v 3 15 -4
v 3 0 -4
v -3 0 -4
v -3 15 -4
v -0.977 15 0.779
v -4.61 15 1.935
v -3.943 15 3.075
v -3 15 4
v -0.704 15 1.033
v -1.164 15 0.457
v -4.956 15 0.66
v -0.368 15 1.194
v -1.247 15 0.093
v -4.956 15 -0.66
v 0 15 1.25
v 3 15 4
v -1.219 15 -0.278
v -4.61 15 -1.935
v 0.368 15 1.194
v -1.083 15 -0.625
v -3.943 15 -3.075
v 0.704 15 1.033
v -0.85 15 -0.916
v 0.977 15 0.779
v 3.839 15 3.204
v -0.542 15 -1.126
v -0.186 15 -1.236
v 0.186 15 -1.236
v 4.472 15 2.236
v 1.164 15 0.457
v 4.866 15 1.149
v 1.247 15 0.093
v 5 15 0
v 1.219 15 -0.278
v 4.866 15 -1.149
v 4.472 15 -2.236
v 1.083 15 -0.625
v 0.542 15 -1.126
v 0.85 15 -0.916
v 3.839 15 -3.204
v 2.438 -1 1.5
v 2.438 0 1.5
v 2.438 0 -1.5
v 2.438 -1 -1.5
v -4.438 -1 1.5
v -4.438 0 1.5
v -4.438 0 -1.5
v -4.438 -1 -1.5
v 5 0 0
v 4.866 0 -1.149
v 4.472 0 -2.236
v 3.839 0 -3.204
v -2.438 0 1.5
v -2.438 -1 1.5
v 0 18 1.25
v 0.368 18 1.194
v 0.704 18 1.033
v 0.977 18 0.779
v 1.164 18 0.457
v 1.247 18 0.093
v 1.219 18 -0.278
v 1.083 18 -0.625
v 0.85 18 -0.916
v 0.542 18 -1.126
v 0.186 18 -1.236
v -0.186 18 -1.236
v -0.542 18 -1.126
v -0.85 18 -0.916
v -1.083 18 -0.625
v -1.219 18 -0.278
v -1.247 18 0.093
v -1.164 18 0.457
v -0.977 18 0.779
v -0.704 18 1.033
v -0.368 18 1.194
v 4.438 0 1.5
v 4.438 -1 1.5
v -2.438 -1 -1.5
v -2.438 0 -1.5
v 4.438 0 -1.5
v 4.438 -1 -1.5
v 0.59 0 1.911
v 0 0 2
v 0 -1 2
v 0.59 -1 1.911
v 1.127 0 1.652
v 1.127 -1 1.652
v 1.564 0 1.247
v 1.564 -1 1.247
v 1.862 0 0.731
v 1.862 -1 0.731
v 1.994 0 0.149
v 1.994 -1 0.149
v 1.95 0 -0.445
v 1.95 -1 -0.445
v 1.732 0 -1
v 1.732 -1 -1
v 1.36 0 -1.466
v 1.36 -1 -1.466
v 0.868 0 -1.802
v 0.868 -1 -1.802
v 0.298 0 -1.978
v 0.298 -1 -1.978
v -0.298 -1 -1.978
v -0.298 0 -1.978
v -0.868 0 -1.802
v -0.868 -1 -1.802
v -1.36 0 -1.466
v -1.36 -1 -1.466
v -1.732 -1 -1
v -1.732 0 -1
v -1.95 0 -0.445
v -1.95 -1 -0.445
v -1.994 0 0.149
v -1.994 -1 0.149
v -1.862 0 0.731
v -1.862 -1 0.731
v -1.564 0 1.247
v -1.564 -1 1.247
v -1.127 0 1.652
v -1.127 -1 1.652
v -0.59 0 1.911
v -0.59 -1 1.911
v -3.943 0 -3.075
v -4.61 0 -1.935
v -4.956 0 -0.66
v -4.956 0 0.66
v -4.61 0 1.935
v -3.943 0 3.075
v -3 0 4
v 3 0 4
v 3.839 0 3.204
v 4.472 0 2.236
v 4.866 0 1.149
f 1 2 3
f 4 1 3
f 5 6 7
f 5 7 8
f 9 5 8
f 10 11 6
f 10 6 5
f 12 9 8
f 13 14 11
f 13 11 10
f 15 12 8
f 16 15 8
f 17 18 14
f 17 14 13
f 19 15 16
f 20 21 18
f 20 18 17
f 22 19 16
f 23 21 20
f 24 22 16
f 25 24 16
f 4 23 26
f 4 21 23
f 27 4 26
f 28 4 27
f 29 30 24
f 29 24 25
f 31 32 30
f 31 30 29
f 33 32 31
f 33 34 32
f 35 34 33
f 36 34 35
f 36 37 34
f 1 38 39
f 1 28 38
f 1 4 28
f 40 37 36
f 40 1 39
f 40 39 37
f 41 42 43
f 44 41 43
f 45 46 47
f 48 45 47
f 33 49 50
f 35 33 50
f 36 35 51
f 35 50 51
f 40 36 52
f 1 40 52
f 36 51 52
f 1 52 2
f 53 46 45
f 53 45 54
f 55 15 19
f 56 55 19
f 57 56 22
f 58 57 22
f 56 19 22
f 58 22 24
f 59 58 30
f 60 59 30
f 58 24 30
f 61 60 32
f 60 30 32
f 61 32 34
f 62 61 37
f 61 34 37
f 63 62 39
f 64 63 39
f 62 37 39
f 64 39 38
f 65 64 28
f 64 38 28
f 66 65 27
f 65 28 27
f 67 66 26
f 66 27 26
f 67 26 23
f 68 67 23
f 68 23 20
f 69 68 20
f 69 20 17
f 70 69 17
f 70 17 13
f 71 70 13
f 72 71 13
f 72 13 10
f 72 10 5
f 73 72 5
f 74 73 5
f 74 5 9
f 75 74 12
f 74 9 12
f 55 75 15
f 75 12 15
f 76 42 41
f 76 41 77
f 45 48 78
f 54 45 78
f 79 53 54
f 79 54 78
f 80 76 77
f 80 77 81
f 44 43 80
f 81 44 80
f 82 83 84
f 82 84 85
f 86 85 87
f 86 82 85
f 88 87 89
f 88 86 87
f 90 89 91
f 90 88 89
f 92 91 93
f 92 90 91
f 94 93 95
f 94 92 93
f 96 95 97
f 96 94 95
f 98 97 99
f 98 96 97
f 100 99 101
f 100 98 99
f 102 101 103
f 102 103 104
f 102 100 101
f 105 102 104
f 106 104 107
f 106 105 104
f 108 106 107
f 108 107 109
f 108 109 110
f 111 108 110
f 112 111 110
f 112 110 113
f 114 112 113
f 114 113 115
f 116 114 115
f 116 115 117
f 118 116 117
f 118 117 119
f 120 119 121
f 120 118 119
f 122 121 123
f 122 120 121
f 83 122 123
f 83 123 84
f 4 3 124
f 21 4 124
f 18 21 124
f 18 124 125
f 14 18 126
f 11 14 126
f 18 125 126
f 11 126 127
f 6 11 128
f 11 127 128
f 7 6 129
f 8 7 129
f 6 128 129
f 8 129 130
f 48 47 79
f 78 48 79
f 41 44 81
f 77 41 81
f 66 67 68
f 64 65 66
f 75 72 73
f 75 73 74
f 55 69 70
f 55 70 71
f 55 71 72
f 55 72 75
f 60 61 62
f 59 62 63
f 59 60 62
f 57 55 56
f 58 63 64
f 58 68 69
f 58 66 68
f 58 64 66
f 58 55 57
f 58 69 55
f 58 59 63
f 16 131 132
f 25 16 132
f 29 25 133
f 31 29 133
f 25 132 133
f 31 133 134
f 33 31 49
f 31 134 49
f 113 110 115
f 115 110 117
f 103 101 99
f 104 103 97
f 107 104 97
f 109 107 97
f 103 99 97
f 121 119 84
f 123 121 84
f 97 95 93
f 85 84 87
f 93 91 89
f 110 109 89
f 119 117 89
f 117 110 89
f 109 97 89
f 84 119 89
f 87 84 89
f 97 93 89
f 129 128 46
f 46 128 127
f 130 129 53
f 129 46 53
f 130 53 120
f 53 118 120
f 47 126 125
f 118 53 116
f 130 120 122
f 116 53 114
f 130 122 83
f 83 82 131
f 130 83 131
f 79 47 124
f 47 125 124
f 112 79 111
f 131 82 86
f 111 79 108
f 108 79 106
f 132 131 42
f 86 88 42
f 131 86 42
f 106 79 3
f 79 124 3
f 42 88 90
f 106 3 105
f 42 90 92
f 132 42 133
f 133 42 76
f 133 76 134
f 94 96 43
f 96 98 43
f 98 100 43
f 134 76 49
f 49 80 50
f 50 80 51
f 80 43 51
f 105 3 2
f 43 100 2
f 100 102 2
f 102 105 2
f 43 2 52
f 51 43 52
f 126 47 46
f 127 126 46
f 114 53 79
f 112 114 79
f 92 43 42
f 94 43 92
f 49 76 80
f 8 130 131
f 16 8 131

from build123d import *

# Parameters (mm, degrees)
SKETCH1_W           = 2
SKETCH1_H           = 3
SKETCH1_R           = 2
SKETCH1_R_2         = 1.25
BOSS_EXTRUDE1_DEPTH = 15
SKETCH1_3_W         = 2
SKETCH1_3_H         = 3
SKETCH1_3_R         = 2
SKETCH1_3_R_2       = 1.25
BOSS_EXTRUDE2_DEPTH = 1
BOSS_EXTRUDE3_START = 15
SKETCH1_4_R         = 1.25
BOSS_EXTRUDE3_DEPTH = 3


with BuildPart() as part:
    # Sketch1 → Boss-Extrude1 (new body)
    # profile 1 of 5: a face of its own
    with BuildSketch(Plane(origin=(0, 0, 0), x_dir=(1, 0, 0), z_dir=(0, 1, 0))):
        with BuildLine():
            Line((3, 4), (-3, 4))
            ThreePointArc((-3, 4), (-5, 0), (-3, -4))
            Line((-3, -4), (3, -4))
            ThreePointArc((3, -4), (4.472135955, -2.236067977), (5, 0))
            ThreePointArc((5, 0), (4.472135955, 2.236067977), (3, 4))
        make_face()
        with Locations((-3.4375, 0)):
            Rectangle(SKETCH1_W, SKETCH1_H, mode=Mode.SUBTRACT)
        Circle(SKETCH1_R, mode=Mode.SUBTRACT)
        with Locations((3.4375, 0)):
            Rectangle(SKETCH1_W, SKETCH1_H, mode=Mode.SUBTRACT)
    # profile 2 of 5: a face of its own
    with BuildSketch(Plane(origin=(0, 0, 0), x_dir=(1, 0, 0), z_dir=(0, 1, 0))):
        with Locations((-3.4375, 0)):
            Rectangle(SKETCH1_W, SKETCH1_H)
    # profile 3 of 5: a face of its own
    with BuildSketch(Plane(origin=(0, 0, 0), x_dir=(1, 0, 0), z_dir=(0, 1, 0))):
        Circle(SKETCH1_R)
        Circle(SKETCH1_R_2, mode=Mode.SUBTRACT)
    # profile 4 of 5: a face of its own
    with BuildSketch(Plane(origin=(0, 0, 0), x_dir=(1, 0, 0), z_dir=(0, 1, 0))):
        Circle(SKETCH1_R_2)
    # profile 5 of 5: a face of its own
    with BuildSketch(Plane(origin=(0, 0, 0), x_dir=(1, 0, 0), z_dir=(0, 1, 0))):
        with Locations((3.4375, 0)):
            Rectangle(SKETCH1_W, SKETCH1_H)
    extrude(amount=BOSS_EXTRUDE1_DEPTH)

    # Sketch1<3> → Boss-Extrude2 (add)
    # profile 1 of 4: a face of its own
    with BuildSketch(Plane(origin=(0, 0, 0), x_dir=(1, 0, 0), z_dir=(0, 1, 0))):
        with Locations((-3.4375, 0)):
            Rectangle(SKETCH1_3_W, SKETCH1_3_H)
    # profile 2 of 4: a face of its own
    with BuildSketch(Plane(origin=(0, 0, 0), x_dir=(1, 0, 0), z_dir=(0, 1, 0))):
        with Locations((3.4375, 0)):
            Rectangle(SKETCH1_3_W, SKETCH1_3_H)
    # profile 3 of 4: a face of its own
    with BuildSketch(Plane(origin=(0, 0, 0), x_dir=(1, 0, 0), z_dir=(0, 1, 0))):
        with Locations(Location((0, 0, 0), (0, 0, 270))):
            Circle(SKETCH1_3_R)
        Circle(SKETCH1_3_R_2, mode=Mode.SUBTRACT)
    # profile 4 of 4: a face of its own
    with BuildSketch(Plane(origin=(0, 0, 0), x_dir=(1, 0, 0), z_dir=(0, 1, 0))):
        Circle(SKETCH1_3_R_2)
    extrude(amount=-BOSS_EXTRUDE2_DEPTH)

    # Sketch1<4> → Boss-Extrude3 (add)
    with BuildSketch(Plane(origin=(0, 0, 0), x_dir=(1, 0, 0), z_dir=(0, 1, 0)).offset(BOSS_EXTRUDE3_START)):
        with Locations(Location((0, 0, 0), (0, 0, 270))):
            Circle(SKETCH1_4_R)
    extrude(amount=BOSS_EXTRUDE3_DEPTH)


solid = part.part
